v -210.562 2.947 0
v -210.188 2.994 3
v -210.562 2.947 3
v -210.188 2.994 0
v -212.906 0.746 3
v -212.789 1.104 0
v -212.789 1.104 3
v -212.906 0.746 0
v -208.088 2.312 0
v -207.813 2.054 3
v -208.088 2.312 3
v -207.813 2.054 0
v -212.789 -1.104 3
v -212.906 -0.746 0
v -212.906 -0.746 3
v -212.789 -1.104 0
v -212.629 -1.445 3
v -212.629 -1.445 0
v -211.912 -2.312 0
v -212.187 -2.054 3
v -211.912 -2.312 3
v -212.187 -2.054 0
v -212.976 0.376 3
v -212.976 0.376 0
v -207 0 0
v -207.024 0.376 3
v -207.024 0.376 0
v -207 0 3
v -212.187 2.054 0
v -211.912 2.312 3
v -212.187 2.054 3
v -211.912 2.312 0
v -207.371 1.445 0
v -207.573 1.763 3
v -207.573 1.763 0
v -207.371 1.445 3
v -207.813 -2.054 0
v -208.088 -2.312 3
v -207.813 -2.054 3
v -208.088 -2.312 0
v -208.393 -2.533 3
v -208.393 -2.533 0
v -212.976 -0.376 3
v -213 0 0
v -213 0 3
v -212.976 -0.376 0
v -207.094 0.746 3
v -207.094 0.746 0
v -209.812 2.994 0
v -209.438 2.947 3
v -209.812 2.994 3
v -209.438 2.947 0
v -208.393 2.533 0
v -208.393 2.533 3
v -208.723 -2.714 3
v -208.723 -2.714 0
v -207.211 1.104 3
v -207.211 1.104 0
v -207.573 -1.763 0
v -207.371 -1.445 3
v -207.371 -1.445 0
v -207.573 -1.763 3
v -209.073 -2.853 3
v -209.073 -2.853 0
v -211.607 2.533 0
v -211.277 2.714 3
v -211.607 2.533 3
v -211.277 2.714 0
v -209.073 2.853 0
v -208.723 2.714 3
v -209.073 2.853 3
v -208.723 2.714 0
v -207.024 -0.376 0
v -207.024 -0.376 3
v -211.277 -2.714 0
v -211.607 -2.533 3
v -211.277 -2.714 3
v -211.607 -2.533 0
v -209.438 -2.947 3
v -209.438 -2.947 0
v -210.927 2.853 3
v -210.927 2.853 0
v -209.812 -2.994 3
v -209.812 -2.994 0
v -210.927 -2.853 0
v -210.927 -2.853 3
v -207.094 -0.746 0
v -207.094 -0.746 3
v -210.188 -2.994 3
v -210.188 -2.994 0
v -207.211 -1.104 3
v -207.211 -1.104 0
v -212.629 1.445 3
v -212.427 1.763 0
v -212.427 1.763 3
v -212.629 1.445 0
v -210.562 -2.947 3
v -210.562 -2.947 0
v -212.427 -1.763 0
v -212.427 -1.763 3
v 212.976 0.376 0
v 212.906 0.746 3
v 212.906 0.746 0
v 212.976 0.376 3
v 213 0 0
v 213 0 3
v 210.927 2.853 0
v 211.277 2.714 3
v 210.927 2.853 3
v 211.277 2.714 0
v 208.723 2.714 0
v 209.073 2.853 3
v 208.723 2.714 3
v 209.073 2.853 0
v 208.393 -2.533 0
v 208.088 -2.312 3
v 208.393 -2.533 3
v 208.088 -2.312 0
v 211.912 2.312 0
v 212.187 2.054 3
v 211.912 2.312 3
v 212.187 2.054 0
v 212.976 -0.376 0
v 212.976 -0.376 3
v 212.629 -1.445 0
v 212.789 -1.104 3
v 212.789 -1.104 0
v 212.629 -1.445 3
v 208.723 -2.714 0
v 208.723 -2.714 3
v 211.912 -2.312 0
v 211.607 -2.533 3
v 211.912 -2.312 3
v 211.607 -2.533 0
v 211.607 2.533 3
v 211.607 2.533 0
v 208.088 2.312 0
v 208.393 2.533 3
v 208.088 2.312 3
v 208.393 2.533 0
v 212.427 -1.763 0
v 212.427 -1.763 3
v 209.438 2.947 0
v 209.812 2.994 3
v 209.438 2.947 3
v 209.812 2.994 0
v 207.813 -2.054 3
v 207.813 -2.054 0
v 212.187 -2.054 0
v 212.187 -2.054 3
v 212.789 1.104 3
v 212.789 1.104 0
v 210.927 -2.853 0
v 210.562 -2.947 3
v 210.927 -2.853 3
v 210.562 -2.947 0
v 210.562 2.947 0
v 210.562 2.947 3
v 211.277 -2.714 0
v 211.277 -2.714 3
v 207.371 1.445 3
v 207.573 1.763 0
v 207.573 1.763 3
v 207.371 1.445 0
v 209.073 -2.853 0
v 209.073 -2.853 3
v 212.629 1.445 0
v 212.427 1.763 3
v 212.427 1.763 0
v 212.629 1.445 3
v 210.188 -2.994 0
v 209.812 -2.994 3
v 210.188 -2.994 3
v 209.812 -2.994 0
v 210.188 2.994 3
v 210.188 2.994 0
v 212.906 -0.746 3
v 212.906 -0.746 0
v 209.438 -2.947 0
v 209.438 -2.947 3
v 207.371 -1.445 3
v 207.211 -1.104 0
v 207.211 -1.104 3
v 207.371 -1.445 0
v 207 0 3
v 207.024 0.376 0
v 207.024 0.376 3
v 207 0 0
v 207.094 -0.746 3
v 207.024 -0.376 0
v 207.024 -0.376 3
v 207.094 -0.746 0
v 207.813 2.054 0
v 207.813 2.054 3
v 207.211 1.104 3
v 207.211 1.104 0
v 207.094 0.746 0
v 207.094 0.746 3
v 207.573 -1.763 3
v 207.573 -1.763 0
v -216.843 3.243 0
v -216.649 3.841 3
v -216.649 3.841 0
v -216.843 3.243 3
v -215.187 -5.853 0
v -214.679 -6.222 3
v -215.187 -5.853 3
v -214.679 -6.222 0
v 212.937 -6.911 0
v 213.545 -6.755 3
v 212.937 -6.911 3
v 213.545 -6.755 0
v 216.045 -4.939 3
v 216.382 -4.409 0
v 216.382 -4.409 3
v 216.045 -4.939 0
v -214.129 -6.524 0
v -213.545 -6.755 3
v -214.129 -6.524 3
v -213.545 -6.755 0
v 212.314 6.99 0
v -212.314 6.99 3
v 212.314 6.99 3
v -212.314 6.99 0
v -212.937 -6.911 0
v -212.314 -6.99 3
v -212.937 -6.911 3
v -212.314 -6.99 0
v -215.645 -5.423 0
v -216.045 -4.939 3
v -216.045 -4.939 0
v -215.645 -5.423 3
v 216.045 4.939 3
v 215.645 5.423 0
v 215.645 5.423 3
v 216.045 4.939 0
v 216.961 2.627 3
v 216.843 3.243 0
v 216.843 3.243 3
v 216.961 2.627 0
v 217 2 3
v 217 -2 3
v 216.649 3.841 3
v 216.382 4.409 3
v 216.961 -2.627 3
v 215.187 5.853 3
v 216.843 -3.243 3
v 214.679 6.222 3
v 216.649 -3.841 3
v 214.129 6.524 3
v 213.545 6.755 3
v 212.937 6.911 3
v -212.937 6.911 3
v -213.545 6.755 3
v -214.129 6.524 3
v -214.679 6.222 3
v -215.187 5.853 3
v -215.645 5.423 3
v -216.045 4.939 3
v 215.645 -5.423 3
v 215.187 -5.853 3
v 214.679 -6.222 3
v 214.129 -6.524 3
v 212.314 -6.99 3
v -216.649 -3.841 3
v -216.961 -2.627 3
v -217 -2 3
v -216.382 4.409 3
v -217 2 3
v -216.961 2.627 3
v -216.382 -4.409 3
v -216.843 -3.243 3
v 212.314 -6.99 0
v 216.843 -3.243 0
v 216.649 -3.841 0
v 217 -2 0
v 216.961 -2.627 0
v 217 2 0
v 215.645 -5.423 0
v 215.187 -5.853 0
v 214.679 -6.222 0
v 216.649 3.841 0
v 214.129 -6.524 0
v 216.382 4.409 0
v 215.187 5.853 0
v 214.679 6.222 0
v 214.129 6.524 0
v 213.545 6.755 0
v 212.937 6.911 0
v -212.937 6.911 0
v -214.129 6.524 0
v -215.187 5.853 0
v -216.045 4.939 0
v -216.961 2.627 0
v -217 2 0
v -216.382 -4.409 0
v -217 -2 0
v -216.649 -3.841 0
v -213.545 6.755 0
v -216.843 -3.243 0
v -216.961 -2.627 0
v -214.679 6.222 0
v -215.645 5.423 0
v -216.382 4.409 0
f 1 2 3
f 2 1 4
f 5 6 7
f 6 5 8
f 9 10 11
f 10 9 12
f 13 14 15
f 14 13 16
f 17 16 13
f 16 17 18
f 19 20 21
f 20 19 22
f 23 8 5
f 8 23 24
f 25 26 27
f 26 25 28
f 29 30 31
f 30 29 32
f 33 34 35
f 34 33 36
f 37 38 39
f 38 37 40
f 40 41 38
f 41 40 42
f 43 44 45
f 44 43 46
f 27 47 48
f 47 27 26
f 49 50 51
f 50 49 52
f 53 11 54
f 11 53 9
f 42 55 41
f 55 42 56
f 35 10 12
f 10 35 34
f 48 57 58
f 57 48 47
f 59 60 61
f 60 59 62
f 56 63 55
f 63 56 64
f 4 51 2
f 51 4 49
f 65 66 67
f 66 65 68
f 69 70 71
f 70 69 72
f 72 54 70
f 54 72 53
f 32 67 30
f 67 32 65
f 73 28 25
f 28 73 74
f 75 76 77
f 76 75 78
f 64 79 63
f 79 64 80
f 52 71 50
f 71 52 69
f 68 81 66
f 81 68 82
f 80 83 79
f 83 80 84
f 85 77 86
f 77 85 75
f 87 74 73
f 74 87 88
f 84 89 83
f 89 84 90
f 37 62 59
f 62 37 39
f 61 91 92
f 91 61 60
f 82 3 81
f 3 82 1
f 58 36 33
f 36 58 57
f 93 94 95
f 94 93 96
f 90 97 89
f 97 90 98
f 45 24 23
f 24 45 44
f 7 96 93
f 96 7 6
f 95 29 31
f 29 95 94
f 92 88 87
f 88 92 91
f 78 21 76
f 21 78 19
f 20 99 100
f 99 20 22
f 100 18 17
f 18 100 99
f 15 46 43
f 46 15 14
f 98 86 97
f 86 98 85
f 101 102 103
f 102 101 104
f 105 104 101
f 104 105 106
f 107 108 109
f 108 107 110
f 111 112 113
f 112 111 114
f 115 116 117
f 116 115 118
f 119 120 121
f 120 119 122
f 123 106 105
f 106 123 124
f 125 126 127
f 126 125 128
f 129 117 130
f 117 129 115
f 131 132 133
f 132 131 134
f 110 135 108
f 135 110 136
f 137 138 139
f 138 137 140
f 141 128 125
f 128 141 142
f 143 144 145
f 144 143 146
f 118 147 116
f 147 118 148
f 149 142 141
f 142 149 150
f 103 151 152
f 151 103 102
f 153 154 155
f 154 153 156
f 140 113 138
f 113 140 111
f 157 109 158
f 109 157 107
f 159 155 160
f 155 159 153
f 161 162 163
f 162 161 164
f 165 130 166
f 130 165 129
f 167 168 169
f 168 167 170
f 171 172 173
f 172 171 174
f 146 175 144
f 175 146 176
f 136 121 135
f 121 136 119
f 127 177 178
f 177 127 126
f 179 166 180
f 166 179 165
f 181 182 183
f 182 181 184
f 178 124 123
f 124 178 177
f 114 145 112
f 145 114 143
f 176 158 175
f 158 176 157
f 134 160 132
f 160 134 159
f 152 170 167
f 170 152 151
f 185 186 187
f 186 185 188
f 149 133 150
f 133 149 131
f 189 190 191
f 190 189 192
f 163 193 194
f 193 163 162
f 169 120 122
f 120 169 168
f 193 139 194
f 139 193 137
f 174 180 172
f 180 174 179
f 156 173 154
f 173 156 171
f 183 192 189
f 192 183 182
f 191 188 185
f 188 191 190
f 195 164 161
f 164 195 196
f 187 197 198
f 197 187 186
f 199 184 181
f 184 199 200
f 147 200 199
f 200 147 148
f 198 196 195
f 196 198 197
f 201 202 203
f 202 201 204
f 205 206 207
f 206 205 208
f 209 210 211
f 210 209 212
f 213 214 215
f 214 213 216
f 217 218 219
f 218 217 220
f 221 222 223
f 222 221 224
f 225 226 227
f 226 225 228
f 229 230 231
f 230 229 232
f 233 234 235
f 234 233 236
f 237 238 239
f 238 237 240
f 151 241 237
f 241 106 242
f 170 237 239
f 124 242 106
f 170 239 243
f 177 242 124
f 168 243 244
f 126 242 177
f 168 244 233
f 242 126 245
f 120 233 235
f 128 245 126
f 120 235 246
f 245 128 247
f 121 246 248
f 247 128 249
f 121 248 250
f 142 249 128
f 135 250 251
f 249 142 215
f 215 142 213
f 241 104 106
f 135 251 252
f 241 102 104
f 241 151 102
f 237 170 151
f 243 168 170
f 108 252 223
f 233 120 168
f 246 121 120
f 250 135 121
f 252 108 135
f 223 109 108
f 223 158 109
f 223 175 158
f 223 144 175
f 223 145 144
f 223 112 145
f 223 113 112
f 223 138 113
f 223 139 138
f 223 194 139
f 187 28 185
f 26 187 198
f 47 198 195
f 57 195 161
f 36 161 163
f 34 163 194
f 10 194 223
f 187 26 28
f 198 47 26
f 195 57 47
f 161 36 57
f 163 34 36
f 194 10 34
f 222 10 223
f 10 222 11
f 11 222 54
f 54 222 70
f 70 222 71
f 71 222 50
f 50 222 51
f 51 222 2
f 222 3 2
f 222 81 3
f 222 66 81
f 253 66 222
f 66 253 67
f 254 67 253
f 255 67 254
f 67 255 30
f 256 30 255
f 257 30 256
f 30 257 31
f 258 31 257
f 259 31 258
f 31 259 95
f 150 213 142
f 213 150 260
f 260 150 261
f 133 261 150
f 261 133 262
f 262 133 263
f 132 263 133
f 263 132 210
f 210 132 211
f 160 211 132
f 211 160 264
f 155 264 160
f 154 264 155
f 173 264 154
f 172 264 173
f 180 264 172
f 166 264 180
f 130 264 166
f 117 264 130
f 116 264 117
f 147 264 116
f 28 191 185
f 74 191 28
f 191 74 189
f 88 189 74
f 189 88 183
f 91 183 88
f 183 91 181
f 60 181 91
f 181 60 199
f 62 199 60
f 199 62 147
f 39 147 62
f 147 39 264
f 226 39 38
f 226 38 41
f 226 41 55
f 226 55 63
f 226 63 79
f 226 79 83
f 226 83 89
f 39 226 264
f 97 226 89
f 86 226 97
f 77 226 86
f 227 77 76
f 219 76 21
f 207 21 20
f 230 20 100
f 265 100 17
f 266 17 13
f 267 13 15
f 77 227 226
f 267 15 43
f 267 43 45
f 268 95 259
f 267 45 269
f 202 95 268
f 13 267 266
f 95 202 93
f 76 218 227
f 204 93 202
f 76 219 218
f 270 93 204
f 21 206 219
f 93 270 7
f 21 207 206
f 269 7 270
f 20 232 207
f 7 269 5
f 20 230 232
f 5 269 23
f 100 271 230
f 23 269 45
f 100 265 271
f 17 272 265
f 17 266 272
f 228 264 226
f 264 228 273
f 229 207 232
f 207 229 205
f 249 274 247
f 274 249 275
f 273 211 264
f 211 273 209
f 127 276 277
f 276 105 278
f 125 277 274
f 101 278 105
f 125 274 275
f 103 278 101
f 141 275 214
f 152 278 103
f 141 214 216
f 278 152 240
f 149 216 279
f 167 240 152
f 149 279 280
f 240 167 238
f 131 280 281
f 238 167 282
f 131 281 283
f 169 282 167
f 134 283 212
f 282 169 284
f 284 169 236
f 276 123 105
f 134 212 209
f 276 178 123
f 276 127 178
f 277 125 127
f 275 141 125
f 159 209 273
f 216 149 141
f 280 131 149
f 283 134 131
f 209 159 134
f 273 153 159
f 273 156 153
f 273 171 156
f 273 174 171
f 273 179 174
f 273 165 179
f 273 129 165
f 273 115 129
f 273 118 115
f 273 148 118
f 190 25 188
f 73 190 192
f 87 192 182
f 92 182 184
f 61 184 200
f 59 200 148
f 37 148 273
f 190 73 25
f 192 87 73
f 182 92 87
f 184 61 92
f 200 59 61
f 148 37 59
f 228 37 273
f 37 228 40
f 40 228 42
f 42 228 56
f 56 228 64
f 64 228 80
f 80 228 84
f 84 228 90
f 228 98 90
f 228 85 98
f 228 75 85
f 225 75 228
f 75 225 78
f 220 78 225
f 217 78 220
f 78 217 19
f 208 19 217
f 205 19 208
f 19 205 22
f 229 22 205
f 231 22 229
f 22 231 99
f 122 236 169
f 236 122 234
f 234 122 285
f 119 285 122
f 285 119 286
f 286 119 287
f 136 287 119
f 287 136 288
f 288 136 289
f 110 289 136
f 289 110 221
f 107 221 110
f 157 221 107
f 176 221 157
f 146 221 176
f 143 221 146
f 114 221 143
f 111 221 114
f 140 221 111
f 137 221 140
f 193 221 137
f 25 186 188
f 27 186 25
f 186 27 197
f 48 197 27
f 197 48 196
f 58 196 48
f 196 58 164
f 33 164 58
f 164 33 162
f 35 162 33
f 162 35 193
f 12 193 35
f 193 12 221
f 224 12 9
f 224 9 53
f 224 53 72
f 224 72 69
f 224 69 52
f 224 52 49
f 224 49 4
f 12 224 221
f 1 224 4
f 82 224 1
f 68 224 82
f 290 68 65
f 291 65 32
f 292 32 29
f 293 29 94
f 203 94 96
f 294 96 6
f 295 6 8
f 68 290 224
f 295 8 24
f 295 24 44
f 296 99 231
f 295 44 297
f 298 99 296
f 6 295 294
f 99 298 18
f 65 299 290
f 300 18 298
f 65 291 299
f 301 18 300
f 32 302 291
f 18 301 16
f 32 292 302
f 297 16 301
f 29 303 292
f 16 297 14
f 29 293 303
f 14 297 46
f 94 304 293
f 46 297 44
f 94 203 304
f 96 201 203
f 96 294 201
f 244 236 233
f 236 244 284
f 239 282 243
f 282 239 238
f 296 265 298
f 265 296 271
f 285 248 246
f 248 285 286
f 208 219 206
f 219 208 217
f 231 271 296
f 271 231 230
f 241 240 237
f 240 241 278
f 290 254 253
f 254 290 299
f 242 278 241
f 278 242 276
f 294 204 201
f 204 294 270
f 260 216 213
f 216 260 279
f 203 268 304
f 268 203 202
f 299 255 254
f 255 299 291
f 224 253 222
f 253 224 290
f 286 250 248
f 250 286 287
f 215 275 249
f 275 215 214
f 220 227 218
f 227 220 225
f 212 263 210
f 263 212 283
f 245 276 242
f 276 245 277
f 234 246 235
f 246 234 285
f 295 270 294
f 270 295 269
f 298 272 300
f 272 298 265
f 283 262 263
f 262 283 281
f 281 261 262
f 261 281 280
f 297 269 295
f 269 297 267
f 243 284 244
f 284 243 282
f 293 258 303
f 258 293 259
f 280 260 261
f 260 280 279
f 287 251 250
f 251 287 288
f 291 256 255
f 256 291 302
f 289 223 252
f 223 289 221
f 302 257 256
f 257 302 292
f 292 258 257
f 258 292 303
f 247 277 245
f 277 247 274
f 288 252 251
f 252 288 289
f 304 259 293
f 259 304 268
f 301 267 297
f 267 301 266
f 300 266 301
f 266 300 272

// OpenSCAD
$fn = 50;


difference() {
	union() {
		hull() {
			translate(v = [-212.0000000000, 2.0000000000, 0]) {
				cylinder(h = 3, r = 5);
			}
			translate(v = [212.0000000000, 2.0000000000, 0]) {
				cylinder(h = 3, r = 5);
			}
			translate(v = [-212.0000000000, -2.0000000000, 0]) {
				cylinder(h = 3, r = 5);
			}
			translate(v = [212.0000000000, -2.0000000000, 0]) {
				cylinder(h = 3, r = 5);
			}
		}
	}
	union() {
		translate(v = [-210.0000000000, 0.0000000000, -100.0000000000]) {
			cylinder(h = 200, r = 3.0000000000);
		}
		translate(v = [-210.0000000000, 0.0000000000, -100.0000000000]) {
			cylinder(h = 200, r = 3.0000000000);
		}
		translate(v = [210.0000000000, 0.0000000000, -100.0000000000]) {
			cylinder(h = 200, r = 3.0000000000);
		}
		translate(v = [210.0000000000, 0.0000000000, -100.0000000000]) {
			cylinder(h = 200, r = 3.0000000000);
		}
	}
}
